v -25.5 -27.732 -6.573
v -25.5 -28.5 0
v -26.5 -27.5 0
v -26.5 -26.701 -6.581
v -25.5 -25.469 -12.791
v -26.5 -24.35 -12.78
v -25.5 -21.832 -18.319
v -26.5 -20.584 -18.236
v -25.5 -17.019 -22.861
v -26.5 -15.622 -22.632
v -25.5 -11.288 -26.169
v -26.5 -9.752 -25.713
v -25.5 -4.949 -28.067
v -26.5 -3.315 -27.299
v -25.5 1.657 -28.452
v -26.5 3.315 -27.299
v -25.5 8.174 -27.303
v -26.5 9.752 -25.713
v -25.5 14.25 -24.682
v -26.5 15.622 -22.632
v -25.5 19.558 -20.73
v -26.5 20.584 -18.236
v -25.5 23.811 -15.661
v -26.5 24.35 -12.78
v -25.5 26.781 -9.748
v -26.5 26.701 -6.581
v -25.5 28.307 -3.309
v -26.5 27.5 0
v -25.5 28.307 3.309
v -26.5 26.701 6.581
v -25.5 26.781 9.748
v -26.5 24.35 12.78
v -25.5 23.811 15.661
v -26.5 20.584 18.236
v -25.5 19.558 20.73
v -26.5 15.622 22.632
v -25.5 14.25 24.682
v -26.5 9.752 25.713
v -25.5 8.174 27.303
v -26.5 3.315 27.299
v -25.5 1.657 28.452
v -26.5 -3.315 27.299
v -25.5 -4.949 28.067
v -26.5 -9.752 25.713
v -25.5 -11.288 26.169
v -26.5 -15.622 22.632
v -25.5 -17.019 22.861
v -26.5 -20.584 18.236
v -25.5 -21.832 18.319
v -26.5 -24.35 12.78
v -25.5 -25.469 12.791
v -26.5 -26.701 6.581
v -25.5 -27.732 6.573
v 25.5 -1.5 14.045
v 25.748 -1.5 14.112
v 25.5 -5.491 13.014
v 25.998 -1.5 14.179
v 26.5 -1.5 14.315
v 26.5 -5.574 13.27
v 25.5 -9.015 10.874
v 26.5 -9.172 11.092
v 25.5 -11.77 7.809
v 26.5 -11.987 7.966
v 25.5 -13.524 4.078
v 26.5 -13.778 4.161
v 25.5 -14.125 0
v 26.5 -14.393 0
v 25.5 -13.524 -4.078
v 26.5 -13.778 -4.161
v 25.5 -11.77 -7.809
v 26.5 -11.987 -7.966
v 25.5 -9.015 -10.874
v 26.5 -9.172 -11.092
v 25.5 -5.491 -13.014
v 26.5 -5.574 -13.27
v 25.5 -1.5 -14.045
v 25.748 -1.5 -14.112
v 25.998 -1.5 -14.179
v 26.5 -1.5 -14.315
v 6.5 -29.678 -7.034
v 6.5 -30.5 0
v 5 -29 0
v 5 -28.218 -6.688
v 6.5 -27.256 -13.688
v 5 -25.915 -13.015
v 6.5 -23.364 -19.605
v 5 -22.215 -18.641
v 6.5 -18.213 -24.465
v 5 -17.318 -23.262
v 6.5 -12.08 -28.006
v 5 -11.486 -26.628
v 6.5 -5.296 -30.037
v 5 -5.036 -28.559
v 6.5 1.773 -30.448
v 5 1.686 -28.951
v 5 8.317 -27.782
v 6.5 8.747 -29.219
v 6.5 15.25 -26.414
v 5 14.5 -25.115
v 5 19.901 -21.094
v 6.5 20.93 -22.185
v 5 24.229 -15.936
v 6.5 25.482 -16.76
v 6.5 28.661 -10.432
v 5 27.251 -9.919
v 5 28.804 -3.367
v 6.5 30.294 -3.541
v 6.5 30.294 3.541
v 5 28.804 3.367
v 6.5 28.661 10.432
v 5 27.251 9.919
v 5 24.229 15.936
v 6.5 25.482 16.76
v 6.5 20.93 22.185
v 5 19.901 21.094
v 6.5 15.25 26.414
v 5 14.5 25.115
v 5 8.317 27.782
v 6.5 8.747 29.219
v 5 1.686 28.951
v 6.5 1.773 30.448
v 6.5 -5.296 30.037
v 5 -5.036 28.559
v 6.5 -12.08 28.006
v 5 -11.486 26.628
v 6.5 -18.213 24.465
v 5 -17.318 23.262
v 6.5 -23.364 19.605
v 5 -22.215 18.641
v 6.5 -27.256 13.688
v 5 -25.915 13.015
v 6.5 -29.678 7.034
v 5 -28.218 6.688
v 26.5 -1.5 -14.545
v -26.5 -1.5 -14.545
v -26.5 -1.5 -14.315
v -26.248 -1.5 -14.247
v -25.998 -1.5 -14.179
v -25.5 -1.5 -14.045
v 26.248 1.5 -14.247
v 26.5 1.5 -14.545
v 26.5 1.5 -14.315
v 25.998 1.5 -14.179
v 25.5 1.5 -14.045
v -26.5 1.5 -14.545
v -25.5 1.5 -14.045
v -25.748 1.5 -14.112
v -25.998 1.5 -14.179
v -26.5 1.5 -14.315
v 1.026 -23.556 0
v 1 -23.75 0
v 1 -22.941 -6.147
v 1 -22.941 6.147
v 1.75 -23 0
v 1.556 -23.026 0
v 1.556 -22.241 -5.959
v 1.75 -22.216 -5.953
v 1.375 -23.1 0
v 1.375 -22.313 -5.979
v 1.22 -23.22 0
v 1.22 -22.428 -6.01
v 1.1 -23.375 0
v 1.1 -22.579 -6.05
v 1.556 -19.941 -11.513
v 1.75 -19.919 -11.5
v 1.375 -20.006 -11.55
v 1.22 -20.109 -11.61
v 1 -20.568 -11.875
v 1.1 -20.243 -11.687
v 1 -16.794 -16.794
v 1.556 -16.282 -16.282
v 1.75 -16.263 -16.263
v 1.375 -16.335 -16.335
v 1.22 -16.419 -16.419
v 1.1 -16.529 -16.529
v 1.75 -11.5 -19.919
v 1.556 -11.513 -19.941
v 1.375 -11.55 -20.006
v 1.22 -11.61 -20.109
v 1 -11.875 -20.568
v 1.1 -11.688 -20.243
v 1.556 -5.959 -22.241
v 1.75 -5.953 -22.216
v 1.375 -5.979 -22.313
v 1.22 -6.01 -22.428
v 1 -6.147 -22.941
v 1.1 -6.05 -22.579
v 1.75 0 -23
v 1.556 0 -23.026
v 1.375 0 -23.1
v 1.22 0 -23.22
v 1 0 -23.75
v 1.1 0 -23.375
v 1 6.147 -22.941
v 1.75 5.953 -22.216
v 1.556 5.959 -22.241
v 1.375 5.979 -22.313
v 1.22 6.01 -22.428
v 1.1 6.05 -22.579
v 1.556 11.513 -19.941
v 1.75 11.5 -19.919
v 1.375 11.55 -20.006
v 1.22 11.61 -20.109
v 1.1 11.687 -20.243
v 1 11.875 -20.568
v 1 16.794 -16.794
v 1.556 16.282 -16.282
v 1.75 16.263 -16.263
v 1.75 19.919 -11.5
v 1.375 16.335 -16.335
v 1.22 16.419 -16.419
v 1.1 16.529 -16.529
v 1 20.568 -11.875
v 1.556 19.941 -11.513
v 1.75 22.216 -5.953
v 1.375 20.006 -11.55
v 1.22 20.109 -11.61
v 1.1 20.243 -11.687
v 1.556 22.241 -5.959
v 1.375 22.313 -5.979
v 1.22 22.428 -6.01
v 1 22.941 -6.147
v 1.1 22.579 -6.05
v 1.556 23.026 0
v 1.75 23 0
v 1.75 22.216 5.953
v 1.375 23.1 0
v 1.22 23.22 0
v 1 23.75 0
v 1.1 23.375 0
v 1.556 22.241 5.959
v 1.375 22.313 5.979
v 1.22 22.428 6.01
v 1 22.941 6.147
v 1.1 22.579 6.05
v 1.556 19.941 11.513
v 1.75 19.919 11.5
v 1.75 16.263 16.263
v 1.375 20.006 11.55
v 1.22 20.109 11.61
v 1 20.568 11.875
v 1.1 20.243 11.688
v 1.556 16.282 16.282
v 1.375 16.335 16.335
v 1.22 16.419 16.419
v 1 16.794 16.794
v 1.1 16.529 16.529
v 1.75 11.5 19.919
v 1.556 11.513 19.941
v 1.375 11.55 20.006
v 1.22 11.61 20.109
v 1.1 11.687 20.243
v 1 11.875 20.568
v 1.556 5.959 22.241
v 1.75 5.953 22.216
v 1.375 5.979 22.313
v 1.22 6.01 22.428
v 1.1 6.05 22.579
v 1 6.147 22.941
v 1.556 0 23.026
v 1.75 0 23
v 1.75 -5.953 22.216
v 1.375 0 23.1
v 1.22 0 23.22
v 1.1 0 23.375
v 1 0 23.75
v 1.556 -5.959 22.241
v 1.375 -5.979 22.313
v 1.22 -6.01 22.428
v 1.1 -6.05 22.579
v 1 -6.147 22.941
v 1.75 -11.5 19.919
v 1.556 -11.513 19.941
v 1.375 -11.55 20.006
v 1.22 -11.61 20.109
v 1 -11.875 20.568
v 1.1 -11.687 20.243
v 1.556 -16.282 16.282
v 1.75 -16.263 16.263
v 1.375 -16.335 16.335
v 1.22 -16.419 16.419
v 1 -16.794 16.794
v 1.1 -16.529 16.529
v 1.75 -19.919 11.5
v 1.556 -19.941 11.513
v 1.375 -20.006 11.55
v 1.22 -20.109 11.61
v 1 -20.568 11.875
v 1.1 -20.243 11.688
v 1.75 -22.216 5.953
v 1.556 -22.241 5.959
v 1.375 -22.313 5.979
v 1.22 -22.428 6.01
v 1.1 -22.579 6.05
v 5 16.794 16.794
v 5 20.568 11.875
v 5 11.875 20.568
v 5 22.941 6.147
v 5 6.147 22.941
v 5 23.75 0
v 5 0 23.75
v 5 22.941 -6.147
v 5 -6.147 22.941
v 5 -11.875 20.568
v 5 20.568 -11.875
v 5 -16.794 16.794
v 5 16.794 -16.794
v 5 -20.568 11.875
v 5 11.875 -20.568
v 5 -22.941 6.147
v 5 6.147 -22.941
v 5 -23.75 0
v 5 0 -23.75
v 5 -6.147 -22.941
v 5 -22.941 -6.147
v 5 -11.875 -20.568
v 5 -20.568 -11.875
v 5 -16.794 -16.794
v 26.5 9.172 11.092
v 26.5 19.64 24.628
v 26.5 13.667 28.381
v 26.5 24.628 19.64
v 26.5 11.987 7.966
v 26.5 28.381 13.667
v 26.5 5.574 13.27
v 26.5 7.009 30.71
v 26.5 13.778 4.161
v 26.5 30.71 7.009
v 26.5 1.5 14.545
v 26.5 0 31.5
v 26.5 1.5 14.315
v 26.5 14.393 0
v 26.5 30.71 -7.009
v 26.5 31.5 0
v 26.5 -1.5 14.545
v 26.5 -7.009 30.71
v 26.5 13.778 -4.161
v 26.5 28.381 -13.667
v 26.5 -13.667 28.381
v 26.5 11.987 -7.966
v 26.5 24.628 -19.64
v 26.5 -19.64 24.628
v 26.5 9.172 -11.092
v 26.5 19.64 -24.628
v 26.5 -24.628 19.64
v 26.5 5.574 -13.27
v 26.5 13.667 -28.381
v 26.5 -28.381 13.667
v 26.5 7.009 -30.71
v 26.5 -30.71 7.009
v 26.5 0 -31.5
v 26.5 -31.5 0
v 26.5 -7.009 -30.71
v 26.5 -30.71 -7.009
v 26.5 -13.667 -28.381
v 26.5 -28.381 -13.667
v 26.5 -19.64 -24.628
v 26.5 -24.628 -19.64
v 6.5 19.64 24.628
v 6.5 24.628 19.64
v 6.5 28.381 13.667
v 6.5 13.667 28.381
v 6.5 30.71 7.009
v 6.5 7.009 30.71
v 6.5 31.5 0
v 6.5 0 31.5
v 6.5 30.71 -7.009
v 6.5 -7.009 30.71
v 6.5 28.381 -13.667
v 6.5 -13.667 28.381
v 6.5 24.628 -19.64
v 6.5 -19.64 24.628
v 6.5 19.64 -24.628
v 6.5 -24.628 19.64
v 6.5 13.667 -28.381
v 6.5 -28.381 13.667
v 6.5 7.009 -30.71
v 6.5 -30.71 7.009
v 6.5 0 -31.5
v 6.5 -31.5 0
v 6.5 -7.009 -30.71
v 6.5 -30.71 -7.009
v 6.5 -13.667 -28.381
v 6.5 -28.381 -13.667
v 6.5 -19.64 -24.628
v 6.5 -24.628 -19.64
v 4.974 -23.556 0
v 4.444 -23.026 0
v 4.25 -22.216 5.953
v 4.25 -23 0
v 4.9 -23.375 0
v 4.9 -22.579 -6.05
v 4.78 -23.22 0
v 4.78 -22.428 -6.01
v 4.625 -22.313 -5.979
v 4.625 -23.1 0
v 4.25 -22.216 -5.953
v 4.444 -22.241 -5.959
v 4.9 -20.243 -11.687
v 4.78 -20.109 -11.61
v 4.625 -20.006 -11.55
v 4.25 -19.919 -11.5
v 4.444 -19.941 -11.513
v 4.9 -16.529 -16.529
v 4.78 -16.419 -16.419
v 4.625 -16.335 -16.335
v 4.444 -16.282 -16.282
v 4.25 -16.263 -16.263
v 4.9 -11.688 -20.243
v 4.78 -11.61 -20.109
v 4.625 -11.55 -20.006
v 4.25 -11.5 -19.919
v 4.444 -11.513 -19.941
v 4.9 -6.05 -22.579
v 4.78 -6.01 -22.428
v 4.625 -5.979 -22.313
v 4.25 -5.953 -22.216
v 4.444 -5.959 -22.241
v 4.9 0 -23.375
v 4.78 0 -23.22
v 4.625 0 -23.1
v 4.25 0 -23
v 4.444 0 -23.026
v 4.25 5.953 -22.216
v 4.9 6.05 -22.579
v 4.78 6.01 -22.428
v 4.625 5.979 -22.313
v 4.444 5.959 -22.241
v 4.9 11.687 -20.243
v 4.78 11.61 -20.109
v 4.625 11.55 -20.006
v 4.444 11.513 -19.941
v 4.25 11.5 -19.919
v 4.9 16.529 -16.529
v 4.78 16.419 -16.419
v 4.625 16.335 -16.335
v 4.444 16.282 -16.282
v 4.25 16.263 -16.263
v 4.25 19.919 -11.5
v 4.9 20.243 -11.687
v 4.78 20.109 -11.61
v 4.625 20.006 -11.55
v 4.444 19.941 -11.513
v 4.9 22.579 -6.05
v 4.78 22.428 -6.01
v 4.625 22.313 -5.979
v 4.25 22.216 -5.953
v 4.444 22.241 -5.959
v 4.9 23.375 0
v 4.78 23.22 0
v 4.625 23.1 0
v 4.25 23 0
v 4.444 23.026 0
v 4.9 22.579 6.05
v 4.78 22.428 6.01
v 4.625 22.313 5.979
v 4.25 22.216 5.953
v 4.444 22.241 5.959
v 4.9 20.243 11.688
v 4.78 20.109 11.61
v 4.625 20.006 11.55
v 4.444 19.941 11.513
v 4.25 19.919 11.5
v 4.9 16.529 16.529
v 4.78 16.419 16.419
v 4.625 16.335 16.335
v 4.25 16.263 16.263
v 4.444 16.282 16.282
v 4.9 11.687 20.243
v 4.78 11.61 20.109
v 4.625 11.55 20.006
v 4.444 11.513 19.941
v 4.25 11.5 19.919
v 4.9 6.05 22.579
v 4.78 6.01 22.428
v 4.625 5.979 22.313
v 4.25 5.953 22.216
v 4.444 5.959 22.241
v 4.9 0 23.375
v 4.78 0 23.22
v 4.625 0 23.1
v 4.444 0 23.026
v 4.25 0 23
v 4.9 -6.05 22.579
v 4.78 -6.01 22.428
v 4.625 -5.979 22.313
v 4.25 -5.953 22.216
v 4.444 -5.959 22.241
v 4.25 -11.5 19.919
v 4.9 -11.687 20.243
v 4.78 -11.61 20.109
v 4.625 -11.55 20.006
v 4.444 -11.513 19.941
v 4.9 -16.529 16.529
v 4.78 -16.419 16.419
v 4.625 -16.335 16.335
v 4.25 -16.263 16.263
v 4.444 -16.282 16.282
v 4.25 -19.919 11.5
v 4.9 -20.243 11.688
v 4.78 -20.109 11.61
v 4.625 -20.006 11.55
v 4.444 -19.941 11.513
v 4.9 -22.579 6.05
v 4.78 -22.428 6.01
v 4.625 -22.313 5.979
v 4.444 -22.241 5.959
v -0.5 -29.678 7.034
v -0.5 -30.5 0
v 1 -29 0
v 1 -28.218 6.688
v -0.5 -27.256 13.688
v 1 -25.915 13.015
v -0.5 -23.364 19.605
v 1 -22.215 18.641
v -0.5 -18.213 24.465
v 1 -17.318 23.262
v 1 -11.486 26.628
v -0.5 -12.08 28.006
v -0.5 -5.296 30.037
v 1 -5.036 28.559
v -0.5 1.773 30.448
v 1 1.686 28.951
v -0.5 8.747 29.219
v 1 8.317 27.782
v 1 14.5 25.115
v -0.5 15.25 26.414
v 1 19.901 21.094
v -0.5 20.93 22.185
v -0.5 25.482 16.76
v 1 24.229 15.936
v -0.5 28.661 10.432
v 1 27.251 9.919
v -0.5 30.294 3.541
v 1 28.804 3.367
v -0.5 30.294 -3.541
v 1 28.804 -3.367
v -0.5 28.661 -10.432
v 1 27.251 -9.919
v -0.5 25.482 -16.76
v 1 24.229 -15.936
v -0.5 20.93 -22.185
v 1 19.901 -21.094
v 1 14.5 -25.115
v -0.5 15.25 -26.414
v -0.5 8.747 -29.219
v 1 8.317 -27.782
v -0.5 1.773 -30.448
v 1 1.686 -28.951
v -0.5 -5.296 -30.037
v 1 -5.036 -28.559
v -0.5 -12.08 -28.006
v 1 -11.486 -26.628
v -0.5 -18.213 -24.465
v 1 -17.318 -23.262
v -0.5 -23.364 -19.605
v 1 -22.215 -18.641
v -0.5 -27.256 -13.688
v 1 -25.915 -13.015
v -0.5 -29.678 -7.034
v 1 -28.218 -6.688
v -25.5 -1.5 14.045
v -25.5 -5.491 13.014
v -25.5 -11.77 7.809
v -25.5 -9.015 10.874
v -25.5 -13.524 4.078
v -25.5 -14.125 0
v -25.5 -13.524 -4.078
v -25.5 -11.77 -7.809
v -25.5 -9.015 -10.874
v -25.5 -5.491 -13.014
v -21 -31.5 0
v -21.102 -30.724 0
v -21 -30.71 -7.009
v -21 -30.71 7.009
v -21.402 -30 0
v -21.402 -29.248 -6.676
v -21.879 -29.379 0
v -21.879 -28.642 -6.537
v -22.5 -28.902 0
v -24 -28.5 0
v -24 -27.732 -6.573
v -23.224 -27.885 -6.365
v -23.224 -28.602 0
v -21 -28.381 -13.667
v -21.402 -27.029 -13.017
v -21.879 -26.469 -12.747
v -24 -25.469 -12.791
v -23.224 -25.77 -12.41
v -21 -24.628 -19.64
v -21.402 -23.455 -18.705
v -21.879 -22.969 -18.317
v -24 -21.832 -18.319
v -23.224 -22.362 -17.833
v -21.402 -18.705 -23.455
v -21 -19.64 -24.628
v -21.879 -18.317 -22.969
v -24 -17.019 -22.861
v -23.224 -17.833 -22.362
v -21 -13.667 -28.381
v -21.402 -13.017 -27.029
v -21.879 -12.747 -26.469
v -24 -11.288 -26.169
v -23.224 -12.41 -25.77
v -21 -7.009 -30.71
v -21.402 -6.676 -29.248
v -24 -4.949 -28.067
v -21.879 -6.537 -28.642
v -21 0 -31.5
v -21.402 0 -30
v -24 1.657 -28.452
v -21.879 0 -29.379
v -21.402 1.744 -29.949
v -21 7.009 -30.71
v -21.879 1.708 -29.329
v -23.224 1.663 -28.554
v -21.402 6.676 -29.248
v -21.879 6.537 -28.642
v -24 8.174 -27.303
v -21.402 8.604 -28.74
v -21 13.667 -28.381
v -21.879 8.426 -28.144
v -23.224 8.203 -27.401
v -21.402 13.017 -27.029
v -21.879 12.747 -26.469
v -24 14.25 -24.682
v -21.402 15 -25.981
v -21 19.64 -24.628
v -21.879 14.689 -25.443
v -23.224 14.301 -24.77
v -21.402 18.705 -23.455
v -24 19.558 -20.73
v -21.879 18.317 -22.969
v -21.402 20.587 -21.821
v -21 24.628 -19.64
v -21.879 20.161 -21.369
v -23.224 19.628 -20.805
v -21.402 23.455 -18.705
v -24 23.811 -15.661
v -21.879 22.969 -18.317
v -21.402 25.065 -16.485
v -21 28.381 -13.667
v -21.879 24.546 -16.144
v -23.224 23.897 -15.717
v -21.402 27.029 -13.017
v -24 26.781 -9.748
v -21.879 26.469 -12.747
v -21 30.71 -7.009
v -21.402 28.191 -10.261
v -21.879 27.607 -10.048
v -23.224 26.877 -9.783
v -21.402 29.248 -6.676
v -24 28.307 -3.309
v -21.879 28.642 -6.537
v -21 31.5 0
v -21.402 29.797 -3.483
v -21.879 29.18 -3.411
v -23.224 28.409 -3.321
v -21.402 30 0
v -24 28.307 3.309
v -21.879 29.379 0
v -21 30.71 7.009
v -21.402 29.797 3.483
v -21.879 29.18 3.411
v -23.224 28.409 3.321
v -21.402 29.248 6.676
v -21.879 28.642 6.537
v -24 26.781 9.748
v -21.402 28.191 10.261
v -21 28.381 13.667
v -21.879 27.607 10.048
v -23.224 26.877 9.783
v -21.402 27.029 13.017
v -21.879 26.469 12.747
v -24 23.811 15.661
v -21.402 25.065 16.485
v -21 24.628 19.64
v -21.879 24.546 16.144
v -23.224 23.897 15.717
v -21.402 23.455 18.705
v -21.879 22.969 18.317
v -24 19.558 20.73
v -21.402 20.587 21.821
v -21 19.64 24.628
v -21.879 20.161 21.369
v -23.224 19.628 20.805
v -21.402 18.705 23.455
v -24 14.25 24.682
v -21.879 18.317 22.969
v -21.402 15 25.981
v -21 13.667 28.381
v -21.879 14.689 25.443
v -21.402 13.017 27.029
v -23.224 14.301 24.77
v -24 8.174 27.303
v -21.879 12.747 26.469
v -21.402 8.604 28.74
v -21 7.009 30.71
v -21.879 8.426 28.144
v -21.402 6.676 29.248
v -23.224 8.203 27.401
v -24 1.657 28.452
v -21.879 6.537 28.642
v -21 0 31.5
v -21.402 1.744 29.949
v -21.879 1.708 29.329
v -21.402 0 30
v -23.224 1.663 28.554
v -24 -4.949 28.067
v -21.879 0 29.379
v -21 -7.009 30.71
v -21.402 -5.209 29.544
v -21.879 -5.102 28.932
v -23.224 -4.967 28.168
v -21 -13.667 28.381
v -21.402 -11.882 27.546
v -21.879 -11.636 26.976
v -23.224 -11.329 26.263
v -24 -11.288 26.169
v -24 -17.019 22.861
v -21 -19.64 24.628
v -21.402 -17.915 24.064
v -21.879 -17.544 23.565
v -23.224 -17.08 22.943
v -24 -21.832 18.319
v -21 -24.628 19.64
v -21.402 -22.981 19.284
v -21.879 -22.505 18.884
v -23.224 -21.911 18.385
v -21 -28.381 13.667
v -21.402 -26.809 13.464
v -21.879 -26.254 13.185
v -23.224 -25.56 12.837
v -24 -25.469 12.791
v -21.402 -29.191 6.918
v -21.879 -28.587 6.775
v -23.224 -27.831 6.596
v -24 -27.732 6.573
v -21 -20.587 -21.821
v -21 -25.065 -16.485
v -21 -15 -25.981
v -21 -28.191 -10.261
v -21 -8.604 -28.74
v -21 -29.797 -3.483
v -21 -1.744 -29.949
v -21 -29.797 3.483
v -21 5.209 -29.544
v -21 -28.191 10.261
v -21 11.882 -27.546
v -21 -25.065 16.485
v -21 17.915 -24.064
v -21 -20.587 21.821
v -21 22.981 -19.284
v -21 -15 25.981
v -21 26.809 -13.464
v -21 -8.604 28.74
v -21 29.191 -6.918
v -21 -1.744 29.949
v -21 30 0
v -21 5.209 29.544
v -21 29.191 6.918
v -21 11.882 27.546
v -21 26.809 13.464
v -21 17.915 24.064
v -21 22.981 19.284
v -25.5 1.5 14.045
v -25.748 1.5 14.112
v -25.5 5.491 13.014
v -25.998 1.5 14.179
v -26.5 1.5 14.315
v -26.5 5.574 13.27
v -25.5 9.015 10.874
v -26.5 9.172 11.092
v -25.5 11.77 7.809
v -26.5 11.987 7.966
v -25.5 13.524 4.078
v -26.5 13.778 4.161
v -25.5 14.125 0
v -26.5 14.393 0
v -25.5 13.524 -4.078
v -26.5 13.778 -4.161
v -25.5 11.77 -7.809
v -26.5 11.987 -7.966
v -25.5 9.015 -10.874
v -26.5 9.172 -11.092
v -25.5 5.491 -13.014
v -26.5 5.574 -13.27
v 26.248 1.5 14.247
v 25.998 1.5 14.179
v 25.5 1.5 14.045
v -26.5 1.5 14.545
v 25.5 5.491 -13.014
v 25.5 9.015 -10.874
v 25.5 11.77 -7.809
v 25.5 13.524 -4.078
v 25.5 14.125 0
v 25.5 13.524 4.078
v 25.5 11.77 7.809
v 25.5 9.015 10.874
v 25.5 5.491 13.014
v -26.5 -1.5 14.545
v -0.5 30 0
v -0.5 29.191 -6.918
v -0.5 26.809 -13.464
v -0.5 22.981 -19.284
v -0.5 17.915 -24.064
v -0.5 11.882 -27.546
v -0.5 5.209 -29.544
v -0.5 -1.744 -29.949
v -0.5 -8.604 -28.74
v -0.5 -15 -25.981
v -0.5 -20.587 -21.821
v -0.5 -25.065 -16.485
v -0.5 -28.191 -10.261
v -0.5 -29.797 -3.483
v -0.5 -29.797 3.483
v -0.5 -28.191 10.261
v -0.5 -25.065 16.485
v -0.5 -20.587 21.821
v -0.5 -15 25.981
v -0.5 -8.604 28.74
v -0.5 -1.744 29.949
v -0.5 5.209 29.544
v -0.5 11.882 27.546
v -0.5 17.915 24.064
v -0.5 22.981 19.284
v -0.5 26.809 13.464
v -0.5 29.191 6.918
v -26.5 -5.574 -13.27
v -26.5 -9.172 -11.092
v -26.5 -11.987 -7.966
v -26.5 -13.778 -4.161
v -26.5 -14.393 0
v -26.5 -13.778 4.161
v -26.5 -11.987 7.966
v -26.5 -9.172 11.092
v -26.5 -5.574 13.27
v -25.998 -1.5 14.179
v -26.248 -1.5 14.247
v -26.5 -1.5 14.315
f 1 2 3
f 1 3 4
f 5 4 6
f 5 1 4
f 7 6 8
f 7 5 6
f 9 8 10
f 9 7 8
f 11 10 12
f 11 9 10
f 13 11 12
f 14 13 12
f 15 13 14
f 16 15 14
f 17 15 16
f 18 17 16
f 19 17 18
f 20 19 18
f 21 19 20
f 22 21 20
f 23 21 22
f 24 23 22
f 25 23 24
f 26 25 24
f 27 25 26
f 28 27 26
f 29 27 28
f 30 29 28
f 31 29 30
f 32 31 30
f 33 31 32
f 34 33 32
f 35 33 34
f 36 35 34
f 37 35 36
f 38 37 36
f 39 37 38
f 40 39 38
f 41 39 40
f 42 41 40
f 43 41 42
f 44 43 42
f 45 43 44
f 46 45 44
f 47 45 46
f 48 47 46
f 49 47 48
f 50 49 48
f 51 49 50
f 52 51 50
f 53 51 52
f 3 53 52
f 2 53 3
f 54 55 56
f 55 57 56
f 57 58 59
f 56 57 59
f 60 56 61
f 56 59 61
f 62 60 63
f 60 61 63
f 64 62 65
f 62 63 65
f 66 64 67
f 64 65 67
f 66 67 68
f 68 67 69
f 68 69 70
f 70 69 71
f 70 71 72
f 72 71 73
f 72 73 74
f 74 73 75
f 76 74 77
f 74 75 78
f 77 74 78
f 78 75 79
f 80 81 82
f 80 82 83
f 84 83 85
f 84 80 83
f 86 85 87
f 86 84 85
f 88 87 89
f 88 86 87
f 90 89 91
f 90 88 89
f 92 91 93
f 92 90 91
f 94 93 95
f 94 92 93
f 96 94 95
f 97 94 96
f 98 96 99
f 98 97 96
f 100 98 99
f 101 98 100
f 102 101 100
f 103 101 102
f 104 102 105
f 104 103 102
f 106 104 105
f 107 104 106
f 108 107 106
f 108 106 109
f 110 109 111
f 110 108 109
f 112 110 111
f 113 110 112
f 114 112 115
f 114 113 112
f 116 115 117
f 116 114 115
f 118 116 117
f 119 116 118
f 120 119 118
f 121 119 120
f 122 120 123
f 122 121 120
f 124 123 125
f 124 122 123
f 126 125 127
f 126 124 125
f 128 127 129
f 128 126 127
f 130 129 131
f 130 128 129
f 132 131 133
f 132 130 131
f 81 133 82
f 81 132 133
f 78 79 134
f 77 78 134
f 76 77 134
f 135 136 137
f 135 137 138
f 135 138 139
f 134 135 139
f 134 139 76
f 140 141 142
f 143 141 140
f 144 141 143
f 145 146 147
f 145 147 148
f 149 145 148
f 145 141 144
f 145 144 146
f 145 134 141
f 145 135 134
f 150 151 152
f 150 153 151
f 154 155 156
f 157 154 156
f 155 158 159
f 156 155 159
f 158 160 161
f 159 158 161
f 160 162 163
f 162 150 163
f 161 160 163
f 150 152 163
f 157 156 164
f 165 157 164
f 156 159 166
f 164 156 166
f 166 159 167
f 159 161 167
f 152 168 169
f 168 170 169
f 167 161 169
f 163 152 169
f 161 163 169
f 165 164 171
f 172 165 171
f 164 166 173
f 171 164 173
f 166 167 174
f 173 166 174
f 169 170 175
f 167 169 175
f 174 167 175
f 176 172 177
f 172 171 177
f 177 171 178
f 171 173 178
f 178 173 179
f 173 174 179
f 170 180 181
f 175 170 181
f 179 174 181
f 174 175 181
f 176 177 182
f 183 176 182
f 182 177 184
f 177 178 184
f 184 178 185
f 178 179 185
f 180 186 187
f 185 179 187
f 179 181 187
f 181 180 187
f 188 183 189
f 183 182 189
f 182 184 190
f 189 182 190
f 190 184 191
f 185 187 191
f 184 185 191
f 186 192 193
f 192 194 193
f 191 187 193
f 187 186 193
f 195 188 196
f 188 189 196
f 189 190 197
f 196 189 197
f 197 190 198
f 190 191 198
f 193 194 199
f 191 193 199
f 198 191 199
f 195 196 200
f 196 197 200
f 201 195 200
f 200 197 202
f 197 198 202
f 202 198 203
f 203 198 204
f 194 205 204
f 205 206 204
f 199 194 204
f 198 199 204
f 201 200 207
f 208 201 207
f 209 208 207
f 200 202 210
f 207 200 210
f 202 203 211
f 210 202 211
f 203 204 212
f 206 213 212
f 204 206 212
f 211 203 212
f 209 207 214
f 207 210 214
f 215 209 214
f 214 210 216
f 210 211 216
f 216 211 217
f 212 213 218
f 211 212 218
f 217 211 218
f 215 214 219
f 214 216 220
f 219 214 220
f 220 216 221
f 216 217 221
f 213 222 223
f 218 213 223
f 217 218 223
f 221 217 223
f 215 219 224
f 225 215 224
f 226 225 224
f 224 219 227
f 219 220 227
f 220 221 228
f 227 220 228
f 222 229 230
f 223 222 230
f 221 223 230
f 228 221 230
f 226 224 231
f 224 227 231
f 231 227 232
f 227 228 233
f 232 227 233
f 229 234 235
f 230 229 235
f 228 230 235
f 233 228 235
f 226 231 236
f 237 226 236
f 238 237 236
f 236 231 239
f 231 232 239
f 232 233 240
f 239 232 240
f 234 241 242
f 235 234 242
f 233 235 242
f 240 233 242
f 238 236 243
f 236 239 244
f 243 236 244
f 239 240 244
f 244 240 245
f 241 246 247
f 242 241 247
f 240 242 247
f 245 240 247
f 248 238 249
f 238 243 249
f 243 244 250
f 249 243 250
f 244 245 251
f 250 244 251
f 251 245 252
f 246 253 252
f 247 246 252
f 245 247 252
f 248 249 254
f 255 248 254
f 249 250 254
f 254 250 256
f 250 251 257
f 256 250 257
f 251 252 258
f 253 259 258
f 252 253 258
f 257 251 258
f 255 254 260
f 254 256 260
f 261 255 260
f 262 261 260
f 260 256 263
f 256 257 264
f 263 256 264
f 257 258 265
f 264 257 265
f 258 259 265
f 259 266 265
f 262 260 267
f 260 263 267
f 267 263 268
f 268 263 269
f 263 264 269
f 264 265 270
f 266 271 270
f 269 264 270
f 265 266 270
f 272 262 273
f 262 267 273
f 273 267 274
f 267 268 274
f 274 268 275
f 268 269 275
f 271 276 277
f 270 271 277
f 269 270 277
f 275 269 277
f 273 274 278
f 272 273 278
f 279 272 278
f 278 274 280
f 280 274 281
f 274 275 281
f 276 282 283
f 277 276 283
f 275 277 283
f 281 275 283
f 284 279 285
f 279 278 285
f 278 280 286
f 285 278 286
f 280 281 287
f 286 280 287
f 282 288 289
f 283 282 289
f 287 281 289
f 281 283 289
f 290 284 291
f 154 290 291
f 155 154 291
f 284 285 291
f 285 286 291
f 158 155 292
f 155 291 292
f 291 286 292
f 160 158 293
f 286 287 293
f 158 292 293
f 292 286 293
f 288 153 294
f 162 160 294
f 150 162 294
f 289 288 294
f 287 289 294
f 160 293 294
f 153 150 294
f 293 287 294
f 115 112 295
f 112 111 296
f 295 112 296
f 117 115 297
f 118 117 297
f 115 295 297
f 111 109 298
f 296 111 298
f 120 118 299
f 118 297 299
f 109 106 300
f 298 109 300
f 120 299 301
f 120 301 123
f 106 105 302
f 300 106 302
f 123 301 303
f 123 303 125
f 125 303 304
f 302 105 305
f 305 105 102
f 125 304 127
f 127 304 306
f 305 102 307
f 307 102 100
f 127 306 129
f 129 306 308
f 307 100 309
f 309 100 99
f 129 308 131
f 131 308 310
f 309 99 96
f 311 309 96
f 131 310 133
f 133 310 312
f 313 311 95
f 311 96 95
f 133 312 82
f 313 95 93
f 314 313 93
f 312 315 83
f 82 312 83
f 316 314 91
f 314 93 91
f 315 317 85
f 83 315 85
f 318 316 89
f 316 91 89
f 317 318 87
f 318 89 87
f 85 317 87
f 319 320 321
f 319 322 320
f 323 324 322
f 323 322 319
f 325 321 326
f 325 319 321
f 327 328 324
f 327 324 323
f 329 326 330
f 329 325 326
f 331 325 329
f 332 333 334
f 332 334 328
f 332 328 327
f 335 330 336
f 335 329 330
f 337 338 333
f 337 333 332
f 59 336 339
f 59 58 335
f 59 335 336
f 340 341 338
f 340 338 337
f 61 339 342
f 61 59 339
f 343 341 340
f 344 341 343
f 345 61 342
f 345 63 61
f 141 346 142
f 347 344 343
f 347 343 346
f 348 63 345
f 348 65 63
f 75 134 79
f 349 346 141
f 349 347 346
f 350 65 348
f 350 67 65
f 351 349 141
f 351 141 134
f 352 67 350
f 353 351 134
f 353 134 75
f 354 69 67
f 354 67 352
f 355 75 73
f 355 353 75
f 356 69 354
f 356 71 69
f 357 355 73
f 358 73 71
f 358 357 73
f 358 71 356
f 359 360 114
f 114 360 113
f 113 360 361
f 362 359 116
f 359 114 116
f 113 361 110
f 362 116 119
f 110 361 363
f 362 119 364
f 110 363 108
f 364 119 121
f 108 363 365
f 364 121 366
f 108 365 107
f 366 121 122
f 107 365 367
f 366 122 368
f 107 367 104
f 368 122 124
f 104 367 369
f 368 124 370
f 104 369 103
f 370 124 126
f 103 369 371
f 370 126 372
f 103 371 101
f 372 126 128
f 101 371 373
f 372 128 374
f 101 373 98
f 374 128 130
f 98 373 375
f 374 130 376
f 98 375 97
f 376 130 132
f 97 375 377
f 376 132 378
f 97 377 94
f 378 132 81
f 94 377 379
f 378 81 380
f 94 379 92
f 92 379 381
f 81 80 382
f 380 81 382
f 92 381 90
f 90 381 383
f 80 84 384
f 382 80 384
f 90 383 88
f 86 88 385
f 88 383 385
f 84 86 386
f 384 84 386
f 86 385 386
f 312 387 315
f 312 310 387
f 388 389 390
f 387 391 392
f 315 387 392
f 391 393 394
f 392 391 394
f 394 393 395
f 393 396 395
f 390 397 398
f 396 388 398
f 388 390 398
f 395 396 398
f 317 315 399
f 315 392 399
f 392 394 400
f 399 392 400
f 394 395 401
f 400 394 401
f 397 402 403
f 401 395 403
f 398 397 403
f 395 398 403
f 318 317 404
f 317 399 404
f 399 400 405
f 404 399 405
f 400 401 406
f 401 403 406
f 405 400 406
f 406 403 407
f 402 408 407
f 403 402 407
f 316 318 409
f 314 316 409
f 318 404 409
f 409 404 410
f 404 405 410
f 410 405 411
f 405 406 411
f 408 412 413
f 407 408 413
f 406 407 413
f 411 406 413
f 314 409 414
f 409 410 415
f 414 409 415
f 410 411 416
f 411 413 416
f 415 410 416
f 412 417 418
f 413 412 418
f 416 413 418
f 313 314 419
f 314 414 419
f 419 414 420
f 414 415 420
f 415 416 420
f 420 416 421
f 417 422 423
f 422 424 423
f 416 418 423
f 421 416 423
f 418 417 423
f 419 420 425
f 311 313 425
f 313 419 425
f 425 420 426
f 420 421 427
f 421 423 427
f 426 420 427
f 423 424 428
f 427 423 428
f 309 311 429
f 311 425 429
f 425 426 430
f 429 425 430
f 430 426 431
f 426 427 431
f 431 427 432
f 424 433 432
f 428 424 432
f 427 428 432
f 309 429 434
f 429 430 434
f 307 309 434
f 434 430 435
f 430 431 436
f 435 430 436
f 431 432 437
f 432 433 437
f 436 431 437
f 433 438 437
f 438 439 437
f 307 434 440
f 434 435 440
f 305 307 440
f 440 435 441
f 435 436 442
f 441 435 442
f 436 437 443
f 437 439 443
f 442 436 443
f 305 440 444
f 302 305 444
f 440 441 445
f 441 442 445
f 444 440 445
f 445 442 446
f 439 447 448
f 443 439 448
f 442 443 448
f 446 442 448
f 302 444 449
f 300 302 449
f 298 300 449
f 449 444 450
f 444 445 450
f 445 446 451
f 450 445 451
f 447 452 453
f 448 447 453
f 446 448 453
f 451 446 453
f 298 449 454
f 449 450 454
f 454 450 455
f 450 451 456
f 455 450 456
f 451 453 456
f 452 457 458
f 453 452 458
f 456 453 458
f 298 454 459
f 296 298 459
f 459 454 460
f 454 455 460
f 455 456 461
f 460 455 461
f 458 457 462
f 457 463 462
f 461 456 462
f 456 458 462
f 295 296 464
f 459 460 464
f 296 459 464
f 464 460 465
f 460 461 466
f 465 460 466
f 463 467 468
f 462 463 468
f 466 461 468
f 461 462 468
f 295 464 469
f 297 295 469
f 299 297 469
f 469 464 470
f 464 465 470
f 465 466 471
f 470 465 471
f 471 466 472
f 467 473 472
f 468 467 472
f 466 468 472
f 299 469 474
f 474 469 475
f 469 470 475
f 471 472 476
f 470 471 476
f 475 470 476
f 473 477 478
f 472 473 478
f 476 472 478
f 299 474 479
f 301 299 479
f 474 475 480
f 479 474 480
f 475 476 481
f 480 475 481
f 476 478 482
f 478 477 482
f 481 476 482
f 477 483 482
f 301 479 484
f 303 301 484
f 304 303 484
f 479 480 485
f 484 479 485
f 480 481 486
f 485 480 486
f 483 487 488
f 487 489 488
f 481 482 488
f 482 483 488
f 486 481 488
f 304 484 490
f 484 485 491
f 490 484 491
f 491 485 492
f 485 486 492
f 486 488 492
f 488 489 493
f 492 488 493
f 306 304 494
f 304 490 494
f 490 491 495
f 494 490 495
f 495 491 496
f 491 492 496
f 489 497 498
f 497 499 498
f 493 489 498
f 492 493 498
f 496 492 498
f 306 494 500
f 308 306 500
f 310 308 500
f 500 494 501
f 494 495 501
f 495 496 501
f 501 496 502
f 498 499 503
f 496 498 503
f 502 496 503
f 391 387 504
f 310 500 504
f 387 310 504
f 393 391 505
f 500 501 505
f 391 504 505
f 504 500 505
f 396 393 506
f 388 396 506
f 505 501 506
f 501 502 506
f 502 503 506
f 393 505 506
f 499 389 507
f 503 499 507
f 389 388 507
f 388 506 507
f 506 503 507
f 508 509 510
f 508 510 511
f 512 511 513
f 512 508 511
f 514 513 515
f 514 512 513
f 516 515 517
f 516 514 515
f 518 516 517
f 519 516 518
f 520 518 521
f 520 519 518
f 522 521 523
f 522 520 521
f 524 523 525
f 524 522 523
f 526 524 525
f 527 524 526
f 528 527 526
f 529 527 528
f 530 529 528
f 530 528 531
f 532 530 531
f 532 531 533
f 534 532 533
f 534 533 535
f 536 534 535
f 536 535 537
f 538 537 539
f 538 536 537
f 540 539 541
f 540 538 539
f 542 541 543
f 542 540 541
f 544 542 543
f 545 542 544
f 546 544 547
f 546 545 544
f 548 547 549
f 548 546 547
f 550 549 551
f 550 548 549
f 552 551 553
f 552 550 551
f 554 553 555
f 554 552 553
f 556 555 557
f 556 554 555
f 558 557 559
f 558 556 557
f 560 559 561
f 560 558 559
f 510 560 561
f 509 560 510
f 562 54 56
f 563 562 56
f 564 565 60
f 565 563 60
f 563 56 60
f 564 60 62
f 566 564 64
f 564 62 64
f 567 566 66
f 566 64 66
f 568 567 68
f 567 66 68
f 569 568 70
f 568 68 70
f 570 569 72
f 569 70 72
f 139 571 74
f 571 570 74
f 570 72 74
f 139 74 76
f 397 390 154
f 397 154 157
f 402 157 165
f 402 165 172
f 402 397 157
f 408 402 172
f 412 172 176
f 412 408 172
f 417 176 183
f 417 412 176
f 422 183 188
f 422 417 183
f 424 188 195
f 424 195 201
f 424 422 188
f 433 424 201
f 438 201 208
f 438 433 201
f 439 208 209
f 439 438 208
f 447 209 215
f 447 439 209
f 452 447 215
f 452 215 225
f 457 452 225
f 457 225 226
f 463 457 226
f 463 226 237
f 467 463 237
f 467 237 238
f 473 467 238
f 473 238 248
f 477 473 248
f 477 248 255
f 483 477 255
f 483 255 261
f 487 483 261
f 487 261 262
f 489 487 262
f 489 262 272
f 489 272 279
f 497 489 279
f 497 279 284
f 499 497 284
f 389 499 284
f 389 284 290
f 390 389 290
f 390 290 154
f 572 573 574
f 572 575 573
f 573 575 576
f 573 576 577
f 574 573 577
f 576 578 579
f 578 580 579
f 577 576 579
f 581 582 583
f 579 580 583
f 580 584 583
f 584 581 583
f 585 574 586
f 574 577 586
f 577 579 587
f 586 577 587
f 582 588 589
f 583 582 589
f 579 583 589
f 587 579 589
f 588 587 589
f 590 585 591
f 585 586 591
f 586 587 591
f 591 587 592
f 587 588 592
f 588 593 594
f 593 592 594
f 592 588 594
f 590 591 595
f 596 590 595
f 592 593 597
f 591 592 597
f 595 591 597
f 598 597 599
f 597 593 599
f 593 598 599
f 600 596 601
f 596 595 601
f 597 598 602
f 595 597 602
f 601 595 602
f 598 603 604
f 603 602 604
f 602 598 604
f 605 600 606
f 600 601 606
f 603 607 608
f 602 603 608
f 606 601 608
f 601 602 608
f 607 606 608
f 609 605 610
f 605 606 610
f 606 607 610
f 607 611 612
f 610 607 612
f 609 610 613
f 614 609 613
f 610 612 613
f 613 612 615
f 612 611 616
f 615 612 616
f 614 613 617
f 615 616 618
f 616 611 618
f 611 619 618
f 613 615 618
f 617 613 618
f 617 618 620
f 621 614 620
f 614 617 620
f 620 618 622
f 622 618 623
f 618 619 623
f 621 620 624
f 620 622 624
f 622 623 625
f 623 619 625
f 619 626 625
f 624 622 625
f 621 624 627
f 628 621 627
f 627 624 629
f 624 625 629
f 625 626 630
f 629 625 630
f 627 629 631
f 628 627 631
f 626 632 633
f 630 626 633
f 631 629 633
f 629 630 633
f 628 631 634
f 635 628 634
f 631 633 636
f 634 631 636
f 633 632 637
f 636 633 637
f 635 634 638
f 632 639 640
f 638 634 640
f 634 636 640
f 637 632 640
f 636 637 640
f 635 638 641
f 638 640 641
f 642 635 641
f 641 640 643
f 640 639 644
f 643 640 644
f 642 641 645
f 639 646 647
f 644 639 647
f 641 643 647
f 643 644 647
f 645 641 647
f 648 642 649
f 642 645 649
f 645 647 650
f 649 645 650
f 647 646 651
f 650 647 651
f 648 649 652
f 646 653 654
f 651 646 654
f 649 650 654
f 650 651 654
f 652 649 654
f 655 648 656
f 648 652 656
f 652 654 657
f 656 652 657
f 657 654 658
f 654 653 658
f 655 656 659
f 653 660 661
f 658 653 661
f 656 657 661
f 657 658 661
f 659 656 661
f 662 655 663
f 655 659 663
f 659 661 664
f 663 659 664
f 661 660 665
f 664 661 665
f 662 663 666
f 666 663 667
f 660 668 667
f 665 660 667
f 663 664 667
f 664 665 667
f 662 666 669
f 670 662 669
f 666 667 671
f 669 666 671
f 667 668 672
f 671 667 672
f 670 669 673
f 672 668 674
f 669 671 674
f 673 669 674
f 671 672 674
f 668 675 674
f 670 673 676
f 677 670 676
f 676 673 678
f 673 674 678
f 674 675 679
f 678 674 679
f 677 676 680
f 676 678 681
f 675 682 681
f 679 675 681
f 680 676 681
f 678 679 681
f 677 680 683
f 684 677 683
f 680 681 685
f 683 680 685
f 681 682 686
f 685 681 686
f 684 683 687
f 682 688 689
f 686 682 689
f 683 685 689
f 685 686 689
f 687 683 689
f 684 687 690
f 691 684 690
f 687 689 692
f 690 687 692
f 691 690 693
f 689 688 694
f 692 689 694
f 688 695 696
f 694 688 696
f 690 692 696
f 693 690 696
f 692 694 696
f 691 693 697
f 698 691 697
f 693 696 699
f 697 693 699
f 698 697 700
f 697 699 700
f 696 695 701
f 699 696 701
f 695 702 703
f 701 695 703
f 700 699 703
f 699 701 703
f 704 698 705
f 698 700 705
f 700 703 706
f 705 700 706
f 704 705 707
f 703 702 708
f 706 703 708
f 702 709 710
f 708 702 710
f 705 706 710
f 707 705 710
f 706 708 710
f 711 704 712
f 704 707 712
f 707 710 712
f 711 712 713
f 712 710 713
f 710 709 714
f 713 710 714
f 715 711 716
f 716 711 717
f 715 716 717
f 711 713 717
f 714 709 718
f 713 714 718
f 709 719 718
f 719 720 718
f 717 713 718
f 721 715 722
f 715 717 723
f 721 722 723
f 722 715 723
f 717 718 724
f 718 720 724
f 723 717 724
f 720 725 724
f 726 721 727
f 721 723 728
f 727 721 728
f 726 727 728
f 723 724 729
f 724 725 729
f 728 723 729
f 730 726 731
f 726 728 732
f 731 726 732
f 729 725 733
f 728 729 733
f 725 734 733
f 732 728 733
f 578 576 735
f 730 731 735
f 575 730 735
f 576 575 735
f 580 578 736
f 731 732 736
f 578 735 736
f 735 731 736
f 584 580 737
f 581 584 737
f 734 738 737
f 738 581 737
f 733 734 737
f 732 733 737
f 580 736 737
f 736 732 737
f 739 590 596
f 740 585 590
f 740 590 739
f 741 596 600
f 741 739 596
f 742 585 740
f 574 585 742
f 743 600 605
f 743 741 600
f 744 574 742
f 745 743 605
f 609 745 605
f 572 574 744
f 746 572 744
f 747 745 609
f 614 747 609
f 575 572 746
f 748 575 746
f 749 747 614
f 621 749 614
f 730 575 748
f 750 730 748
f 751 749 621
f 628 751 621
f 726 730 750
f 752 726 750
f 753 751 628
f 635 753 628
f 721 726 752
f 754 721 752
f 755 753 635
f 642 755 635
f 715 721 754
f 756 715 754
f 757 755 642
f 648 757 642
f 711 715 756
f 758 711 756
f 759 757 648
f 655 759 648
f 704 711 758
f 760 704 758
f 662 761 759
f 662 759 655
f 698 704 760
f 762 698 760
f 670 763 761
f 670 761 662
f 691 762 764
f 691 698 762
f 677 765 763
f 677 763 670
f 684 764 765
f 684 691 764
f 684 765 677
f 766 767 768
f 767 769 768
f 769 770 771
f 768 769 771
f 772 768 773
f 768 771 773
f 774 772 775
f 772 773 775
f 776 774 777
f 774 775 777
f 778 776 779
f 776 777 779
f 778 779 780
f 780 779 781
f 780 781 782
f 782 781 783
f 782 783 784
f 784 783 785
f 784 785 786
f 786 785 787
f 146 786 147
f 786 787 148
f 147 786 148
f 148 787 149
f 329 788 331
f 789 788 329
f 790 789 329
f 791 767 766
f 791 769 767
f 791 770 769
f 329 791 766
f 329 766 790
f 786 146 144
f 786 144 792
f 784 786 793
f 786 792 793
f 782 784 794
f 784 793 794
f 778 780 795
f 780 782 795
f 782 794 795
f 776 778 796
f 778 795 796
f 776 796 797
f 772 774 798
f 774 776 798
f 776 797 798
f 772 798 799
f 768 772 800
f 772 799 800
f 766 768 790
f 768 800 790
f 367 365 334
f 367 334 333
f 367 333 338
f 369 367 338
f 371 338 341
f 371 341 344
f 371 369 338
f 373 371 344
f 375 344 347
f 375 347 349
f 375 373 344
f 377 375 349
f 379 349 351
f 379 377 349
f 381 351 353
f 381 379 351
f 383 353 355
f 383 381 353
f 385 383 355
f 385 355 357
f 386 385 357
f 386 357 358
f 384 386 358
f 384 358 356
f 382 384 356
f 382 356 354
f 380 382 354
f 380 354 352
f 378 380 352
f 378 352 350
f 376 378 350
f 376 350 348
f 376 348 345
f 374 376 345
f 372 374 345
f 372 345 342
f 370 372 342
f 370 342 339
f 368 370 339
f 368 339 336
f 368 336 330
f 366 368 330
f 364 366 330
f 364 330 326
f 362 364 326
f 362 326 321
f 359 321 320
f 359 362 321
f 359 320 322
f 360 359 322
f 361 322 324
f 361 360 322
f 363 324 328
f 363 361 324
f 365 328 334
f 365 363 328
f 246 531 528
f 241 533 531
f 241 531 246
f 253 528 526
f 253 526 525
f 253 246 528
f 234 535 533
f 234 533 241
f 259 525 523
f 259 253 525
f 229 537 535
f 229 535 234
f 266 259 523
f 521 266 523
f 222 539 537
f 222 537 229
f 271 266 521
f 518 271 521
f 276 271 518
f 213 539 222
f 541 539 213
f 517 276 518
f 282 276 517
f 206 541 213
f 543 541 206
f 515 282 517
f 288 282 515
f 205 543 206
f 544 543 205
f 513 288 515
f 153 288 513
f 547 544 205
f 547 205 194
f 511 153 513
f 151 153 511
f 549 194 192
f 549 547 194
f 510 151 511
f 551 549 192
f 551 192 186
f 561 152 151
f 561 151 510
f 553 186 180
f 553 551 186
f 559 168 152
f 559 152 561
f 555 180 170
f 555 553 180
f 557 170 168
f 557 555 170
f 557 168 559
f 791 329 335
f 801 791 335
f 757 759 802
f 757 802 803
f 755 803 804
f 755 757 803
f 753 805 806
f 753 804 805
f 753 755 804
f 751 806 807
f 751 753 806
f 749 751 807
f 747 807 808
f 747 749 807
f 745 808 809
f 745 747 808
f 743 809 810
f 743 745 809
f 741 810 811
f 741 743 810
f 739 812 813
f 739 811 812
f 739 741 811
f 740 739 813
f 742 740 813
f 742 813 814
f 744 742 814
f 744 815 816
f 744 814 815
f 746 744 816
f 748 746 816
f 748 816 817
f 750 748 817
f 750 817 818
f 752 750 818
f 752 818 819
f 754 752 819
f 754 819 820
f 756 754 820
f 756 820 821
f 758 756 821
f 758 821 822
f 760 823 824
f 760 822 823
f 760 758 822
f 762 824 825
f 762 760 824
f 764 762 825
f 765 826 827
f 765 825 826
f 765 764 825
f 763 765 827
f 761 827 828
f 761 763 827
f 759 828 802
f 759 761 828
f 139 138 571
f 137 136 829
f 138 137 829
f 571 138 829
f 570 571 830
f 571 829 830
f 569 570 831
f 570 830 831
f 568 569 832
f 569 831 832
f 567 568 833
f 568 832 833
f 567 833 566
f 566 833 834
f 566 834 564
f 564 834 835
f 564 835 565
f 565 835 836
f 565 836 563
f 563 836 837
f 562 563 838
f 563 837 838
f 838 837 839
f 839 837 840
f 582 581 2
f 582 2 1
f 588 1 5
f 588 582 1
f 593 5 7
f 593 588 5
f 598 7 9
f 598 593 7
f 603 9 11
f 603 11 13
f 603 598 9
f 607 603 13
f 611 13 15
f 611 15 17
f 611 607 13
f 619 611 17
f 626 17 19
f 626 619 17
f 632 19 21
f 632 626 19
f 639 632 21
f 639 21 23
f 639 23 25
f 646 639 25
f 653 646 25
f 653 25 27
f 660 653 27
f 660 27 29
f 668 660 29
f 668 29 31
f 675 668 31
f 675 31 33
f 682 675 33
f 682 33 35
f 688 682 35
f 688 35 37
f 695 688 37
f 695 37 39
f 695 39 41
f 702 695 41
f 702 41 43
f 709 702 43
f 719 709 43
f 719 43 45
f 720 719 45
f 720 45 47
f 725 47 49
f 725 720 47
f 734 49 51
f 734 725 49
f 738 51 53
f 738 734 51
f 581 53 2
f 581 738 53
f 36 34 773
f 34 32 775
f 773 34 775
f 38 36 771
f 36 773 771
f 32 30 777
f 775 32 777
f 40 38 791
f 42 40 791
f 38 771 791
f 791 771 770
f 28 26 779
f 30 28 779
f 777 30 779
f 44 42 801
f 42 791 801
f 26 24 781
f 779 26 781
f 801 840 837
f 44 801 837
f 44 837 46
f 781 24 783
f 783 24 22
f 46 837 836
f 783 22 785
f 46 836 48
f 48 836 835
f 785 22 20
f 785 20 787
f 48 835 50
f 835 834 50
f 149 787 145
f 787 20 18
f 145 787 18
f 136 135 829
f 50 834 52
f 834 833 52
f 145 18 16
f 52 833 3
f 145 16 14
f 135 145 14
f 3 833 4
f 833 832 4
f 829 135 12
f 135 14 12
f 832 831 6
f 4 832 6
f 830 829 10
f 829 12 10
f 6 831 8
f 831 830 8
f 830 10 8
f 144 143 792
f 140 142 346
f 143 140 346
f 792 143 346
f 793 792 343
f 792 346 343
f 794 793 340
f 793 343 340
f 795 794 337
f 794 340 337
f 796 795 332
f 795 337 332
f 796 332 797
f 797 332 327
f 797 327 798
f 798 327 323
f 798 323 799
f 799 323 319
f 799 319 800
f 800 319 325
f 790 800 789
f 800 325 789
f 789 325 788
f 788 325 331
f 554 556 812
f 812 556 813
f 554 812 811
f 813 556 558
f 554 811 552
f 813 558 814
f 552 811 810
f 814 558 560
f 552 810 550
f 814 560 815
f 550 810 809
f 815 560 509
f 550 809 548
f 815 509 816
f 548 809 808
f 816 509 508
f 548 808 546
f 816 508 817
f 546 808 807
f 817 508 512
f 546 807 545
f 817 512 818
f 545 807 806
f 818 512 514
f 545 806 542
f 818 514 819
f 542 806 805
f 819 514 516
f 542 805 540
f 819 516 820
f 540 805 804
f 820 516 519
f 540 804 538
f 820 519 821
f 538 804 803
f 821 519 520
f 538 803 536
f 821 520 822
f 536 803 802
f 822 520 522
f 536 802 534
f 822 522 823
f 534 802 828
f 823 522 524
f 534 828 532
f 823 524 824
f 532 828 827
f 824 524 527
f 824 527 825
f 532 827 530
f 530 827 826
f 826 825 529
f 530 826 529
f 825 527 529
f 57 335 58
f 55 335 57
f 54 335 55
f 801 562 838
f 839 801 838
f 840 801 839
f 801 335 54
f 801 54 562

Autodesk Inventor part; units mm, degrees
ref_plane "YZ Plane" through (0, 0, 0) normal (1, 0, 0) x (0, 1, 0)
ref_plane "XZ Plane" through (0, 0, 0) normal (0, 1, 0) x (-1, 0, 0)
ref_plane "XY Plane" through (0, 0, 0) normal (0, 0, 1) x (1, 0, 0)
sketch "Эскиз1" plane through (0, 0, 0) normal (0, 0, 1) x (1, 0, 0)
  line L0 (-26.5, 0) -> (26.5, 0)
  line L1 (-26.5, -14.3929) -> (-26.5, -27.5)
  line L2 (-25.5, -28.5) -> (-24, -28.5)
  line L3 (-26.5, -14.3929) -> (-25.5, -14.125)
  line L4 (-25.5, -14.125) -> (25.5, -14.125)
  line L5 (-25.5, -28.5) -> (-26.5, -27.5)
  line L6 (-21, -31.5) -> (-21, -36.75)
  arc A0 (-21, -31.5) -> (-24, -28.5) centre (-24, -31.5) ccw
  line L7 (-21, -36.75) -> (-0.5, -36.75)
  line L8 (-0.5, -36.75) -> (-0.5, -30.5)
  line L9 (-0.5, -30.5) -> (1, -29)
  line L10 (1, -29) -> (1, -23)
  line L11 (1, -23) -> (5, -23)
  line L12 (5, -23) -> (5, -29)
  line L13 (5, -29) -> (6.5, -30.5)
  line L14 (6.5, -30.5) -> (6.5, -45.125)
  line L15 (6.5, -45.125) -> (26.5, -45.125)
  line L16 (26.5, -45.125) -> (26.5, -14.3929)
  line L17 (26.5, -14.3929) -> (25.5, -14.125)
  point P0 (0, 0)
  point P1 (0, 0)
  point P2 (-26.5, -28.5)
  dimension "d0" = 53
  dimension "d1" = 28.25
  dimension "d2" = 15
  dimension "d3" = 57
  dimension "d4" = 1
  dimension "d5" = 1
  dimension "d6" = 45
  dimension "d7" = 3
  dimension "d8" = 73.5
  dimension "d9" = 5.5
  dimension "d10" = 7
  dimension "d11" = 4
  dimension "d12" = 46
  dimension "d13" = 21.5
  dimension "d14" = 20
  dimension "d15" = 58
  dimension "d16" = 45
  dimension "d17" = 15
  dimension "d18" = 1
  dimension "d19" = 90.25
revolve "Вращение1" add sketch "Эскиз1" angle 360 about axis through (-26.5, 0, 0) along (1, 0, 0)
sketch "Эскиз2" plane through (0, 0, 0) normal (0, 0, 1) x (1, 0, 0)
  line L0 (26.5, 45.125) -> (6.5, 45.125) projected
  line L1 (26.5, 0) -> (6.5, 0)
  line L2 (26.5, 45.125) -> (26.5, -45.125) projected
  line L3 (6.5, 45.125) -> (26.5, 45.125)
  line L4 (26.5, 45.125) -> (26.5, 31.5)
  line L5 (26.5, 31.5) -> (6.5, 31.5)
  line L6 (6.5, 31.5) -> (6.5, 45.125)
  point P0 (0, 0)
  dimension "d21" = 63
revolve "Вращение2" cut sketch "Эскиз2" angle 360 about axis through (26.5, 0, 0) along (-1, 0, 0)
fillet "Сопряжение1" radius 0.75 2 edges at (1, 23, 0) (5, 23, 0)
sketch "Эскиз3" plane through (0, 0, 0) normal (0, 0, 1) x (1, 0, 0)
  line L0 (-21, 36.75) -> (-21, -36.75) projected
  line L1 (-0.5, 36.75) -> (-0.5, -36.75) projected
  line L2 (-21, 31.5) -> (-21, -31.5) projected
  line L3 (-21, 0) -> (0, 0)
  line L4 (-21, 36.75) -> (-0.5, 36.75)
  line L5 (-0.5, 36.75) -> (-0.5, 30)
  line L6 (-0.5, 30) -> (-21, 30)
  line L7 (-21, 30) -> (-21, 36.75)
  point P0 (-21, 30)
  dimension "d24" = 60
revolve "Вращение3" cut sketch "Эскиз3" angle 360 about axis through (-21, 0, 0) along (1, 0, 0) contours L4 L1 L6 L0
sketch "Эскиз4" plane through (-26.5, 0, 0) normal (-1, 0, 0) x (0, 0, 1)
  line L0 (-14.5451, 1.5) -> (-14.0451, 1.5)
  line L1 (-14.0451, 1.5) -> (-14.0451, -1.5)
  line L2 (-14.0451, -1.5) -> (-14.5451, -1.5)
  line L3 (-14.5451, -1.5) -> (-14.5451, 1.5)
  circle A0 centre (0, 0) radius 14.125 projected
  point P0 (0, 0)
  point P1 (-14.0451, 0)
  dimension "d26" = 3
  dimension "d27" = 0.5
extrude "Выдавливание1" cut sketch "Эскиз4" against normal through all contours L0 A0 L2 L3 | L1 A0 picked at (-14.0688, 0.1669)
mirror "Зеркальное отражение1" about plane through (0, 0, 0) normal (0, 0, 1) of "Выдавливание1"
properties part number "71. Блок шестерен заднего хода"
